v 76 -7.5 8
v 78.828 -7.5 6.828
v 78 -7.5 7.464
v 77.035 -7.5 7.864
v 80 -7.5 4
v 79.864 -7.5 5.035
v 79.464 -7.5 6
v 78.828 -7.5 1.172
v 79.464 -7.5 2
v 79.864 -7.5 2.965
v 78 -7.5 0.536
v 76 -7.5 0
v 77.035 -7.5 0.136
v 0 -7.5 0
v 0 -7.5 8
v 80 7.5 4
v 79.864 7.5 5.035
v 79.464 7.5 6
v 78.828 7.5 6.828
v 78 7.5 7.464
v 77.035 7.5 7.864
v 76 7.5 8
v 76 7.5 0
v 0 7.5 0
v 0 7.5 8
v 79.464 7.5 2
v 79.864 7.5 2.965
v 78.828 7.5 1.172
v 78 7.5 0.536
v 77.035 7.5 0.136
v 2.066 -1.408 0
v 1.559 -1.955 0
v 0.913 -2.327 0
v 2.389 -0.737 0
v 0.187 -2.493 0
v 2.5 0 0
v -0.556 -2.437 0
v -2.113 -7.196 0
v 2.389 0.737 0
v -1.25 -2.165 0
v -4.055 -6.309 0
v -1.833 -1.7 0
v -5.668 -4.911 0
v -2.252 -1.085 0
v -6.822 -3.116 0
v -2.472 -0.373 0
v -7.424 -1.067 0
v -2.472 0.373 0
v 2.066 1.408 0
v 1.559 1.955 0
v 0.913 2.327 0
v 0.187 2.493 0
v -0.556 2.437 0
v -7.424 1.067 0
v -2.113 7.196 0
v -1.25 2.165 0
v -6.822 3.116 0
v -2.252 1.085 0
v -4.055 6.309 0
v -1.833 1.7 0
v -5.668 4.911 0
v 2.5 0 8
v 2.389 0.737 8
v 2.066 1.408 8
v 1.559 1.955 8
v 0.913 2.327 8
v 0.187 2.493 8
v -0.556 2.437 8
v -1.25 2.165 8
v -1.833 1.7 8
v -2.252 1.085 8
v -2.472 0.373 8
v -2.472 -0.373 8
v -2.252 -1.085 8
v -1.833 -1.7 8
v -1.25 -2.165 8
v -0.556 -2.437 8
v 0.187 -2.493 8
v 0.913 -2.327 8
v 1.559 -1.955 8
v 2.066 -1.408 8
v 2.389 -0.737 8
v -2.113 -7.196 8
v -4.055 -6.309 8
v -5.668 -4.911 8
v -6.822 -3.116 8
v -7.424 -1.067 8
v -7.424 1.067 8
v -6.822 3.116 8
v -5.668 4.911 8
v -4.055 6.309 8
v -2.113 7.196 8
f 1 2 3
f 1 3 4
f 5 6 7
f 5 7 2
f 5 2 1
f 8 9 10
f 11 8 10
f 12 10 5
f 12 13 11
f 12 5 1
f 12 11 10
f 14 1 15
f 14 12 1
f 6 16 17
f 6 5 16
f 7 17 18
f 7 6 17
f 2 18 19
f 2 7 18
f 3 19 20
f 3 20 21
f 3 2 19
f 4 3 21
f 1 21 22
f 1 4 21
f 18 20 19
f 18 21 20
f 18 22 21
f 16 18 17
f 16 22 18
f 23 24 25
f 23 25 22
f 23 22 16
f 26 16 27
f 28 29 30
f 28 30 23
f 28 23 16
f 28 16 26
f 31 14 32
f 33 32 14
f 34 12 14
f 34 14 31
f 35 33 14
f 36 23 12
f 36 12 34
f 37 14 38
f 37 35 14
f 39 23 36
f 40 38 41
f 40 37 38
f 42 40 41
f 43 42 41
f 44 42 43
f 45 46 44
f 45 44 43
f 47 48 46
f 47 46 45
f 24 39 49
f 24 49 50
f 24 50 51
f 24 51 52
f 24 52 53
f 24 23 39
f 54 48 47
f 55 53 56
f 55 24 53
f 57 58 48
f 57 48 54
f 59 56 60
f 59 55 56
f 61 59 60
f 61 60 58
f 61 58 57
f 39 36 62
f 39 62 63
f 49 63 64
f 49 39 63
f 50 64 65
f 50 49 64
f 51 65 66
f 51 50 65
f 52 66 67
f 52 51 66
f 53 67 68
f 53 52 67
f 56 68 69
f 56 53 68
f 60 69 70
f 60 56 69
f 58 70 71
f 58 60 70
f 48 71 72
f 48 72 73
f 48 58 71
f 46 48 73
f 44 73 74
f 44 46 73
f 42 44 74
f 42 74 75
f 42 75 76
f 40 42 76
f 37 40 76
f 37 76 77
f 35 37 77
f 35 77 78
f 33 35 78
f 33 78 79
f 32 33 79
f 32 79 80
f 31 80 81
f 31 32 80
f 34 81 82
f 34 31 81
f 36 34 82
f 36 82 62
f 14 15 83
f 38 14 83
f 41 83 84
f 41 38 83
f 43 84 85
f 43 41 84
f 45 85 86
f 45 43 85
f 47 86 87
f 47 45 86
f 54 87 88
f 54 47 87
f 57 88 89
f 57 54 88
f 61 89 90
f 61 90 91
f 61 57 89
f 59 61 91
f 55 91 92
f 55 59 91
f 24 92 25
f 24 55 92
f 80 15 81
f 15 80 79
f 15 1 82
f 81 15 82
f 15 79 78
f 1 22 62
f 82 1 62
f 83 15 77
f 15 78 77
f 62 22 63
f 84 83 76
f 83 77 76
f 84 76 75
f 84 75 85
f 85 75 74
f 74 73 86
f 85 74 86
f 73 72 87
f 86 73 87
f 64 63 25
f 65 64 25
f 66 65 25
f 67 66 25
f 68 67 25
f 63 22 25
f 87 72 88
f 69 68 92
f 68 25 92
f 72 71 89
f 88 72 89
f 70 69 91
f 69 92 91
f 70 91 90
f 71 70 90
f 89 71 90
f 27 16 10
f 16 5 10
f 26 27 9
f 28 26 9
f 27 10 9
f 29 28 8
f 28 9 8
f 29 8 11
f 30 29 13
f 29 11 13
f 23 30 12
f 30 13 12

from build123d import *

# Parameters (mm, degrees)
ESQUISSE1_R        = 2.5
BOSS_EXTRU_1_DEPTH = 8
CONG_1_R           = 4


with BuildPart() as part:
    # Esquisse1 → Boss.-Extru.1 (new body)
    with BuildSketch(Plane.XY):
        with BuildLine():
            Line((0, 7.5), (80, 7.5))
            Line((80, 7.5), (80, -7.5))
            Line((80, -7.5), (0, -7.5))
            ThreePointArc((0, -7.5), (-7.5, 0), (0, 7.5))
        make_face()
        Circle(ESQUISSE1_R, mode=Mode.SUBTRACT)
    extrude(amount=BOSS_EXTRU_1_DEPTH)

    # Congé1
    cong_1_edges = [part.edges().sort_by_distance(p)[0] for p in [
        (80, 0, 0),
        (80, 0, 8),
    ]]
    fillet(cong_1_edges, radius=CONG_1_R - 0.0001)  # a hair under: the kernel refuses the full size


solid = part.part
